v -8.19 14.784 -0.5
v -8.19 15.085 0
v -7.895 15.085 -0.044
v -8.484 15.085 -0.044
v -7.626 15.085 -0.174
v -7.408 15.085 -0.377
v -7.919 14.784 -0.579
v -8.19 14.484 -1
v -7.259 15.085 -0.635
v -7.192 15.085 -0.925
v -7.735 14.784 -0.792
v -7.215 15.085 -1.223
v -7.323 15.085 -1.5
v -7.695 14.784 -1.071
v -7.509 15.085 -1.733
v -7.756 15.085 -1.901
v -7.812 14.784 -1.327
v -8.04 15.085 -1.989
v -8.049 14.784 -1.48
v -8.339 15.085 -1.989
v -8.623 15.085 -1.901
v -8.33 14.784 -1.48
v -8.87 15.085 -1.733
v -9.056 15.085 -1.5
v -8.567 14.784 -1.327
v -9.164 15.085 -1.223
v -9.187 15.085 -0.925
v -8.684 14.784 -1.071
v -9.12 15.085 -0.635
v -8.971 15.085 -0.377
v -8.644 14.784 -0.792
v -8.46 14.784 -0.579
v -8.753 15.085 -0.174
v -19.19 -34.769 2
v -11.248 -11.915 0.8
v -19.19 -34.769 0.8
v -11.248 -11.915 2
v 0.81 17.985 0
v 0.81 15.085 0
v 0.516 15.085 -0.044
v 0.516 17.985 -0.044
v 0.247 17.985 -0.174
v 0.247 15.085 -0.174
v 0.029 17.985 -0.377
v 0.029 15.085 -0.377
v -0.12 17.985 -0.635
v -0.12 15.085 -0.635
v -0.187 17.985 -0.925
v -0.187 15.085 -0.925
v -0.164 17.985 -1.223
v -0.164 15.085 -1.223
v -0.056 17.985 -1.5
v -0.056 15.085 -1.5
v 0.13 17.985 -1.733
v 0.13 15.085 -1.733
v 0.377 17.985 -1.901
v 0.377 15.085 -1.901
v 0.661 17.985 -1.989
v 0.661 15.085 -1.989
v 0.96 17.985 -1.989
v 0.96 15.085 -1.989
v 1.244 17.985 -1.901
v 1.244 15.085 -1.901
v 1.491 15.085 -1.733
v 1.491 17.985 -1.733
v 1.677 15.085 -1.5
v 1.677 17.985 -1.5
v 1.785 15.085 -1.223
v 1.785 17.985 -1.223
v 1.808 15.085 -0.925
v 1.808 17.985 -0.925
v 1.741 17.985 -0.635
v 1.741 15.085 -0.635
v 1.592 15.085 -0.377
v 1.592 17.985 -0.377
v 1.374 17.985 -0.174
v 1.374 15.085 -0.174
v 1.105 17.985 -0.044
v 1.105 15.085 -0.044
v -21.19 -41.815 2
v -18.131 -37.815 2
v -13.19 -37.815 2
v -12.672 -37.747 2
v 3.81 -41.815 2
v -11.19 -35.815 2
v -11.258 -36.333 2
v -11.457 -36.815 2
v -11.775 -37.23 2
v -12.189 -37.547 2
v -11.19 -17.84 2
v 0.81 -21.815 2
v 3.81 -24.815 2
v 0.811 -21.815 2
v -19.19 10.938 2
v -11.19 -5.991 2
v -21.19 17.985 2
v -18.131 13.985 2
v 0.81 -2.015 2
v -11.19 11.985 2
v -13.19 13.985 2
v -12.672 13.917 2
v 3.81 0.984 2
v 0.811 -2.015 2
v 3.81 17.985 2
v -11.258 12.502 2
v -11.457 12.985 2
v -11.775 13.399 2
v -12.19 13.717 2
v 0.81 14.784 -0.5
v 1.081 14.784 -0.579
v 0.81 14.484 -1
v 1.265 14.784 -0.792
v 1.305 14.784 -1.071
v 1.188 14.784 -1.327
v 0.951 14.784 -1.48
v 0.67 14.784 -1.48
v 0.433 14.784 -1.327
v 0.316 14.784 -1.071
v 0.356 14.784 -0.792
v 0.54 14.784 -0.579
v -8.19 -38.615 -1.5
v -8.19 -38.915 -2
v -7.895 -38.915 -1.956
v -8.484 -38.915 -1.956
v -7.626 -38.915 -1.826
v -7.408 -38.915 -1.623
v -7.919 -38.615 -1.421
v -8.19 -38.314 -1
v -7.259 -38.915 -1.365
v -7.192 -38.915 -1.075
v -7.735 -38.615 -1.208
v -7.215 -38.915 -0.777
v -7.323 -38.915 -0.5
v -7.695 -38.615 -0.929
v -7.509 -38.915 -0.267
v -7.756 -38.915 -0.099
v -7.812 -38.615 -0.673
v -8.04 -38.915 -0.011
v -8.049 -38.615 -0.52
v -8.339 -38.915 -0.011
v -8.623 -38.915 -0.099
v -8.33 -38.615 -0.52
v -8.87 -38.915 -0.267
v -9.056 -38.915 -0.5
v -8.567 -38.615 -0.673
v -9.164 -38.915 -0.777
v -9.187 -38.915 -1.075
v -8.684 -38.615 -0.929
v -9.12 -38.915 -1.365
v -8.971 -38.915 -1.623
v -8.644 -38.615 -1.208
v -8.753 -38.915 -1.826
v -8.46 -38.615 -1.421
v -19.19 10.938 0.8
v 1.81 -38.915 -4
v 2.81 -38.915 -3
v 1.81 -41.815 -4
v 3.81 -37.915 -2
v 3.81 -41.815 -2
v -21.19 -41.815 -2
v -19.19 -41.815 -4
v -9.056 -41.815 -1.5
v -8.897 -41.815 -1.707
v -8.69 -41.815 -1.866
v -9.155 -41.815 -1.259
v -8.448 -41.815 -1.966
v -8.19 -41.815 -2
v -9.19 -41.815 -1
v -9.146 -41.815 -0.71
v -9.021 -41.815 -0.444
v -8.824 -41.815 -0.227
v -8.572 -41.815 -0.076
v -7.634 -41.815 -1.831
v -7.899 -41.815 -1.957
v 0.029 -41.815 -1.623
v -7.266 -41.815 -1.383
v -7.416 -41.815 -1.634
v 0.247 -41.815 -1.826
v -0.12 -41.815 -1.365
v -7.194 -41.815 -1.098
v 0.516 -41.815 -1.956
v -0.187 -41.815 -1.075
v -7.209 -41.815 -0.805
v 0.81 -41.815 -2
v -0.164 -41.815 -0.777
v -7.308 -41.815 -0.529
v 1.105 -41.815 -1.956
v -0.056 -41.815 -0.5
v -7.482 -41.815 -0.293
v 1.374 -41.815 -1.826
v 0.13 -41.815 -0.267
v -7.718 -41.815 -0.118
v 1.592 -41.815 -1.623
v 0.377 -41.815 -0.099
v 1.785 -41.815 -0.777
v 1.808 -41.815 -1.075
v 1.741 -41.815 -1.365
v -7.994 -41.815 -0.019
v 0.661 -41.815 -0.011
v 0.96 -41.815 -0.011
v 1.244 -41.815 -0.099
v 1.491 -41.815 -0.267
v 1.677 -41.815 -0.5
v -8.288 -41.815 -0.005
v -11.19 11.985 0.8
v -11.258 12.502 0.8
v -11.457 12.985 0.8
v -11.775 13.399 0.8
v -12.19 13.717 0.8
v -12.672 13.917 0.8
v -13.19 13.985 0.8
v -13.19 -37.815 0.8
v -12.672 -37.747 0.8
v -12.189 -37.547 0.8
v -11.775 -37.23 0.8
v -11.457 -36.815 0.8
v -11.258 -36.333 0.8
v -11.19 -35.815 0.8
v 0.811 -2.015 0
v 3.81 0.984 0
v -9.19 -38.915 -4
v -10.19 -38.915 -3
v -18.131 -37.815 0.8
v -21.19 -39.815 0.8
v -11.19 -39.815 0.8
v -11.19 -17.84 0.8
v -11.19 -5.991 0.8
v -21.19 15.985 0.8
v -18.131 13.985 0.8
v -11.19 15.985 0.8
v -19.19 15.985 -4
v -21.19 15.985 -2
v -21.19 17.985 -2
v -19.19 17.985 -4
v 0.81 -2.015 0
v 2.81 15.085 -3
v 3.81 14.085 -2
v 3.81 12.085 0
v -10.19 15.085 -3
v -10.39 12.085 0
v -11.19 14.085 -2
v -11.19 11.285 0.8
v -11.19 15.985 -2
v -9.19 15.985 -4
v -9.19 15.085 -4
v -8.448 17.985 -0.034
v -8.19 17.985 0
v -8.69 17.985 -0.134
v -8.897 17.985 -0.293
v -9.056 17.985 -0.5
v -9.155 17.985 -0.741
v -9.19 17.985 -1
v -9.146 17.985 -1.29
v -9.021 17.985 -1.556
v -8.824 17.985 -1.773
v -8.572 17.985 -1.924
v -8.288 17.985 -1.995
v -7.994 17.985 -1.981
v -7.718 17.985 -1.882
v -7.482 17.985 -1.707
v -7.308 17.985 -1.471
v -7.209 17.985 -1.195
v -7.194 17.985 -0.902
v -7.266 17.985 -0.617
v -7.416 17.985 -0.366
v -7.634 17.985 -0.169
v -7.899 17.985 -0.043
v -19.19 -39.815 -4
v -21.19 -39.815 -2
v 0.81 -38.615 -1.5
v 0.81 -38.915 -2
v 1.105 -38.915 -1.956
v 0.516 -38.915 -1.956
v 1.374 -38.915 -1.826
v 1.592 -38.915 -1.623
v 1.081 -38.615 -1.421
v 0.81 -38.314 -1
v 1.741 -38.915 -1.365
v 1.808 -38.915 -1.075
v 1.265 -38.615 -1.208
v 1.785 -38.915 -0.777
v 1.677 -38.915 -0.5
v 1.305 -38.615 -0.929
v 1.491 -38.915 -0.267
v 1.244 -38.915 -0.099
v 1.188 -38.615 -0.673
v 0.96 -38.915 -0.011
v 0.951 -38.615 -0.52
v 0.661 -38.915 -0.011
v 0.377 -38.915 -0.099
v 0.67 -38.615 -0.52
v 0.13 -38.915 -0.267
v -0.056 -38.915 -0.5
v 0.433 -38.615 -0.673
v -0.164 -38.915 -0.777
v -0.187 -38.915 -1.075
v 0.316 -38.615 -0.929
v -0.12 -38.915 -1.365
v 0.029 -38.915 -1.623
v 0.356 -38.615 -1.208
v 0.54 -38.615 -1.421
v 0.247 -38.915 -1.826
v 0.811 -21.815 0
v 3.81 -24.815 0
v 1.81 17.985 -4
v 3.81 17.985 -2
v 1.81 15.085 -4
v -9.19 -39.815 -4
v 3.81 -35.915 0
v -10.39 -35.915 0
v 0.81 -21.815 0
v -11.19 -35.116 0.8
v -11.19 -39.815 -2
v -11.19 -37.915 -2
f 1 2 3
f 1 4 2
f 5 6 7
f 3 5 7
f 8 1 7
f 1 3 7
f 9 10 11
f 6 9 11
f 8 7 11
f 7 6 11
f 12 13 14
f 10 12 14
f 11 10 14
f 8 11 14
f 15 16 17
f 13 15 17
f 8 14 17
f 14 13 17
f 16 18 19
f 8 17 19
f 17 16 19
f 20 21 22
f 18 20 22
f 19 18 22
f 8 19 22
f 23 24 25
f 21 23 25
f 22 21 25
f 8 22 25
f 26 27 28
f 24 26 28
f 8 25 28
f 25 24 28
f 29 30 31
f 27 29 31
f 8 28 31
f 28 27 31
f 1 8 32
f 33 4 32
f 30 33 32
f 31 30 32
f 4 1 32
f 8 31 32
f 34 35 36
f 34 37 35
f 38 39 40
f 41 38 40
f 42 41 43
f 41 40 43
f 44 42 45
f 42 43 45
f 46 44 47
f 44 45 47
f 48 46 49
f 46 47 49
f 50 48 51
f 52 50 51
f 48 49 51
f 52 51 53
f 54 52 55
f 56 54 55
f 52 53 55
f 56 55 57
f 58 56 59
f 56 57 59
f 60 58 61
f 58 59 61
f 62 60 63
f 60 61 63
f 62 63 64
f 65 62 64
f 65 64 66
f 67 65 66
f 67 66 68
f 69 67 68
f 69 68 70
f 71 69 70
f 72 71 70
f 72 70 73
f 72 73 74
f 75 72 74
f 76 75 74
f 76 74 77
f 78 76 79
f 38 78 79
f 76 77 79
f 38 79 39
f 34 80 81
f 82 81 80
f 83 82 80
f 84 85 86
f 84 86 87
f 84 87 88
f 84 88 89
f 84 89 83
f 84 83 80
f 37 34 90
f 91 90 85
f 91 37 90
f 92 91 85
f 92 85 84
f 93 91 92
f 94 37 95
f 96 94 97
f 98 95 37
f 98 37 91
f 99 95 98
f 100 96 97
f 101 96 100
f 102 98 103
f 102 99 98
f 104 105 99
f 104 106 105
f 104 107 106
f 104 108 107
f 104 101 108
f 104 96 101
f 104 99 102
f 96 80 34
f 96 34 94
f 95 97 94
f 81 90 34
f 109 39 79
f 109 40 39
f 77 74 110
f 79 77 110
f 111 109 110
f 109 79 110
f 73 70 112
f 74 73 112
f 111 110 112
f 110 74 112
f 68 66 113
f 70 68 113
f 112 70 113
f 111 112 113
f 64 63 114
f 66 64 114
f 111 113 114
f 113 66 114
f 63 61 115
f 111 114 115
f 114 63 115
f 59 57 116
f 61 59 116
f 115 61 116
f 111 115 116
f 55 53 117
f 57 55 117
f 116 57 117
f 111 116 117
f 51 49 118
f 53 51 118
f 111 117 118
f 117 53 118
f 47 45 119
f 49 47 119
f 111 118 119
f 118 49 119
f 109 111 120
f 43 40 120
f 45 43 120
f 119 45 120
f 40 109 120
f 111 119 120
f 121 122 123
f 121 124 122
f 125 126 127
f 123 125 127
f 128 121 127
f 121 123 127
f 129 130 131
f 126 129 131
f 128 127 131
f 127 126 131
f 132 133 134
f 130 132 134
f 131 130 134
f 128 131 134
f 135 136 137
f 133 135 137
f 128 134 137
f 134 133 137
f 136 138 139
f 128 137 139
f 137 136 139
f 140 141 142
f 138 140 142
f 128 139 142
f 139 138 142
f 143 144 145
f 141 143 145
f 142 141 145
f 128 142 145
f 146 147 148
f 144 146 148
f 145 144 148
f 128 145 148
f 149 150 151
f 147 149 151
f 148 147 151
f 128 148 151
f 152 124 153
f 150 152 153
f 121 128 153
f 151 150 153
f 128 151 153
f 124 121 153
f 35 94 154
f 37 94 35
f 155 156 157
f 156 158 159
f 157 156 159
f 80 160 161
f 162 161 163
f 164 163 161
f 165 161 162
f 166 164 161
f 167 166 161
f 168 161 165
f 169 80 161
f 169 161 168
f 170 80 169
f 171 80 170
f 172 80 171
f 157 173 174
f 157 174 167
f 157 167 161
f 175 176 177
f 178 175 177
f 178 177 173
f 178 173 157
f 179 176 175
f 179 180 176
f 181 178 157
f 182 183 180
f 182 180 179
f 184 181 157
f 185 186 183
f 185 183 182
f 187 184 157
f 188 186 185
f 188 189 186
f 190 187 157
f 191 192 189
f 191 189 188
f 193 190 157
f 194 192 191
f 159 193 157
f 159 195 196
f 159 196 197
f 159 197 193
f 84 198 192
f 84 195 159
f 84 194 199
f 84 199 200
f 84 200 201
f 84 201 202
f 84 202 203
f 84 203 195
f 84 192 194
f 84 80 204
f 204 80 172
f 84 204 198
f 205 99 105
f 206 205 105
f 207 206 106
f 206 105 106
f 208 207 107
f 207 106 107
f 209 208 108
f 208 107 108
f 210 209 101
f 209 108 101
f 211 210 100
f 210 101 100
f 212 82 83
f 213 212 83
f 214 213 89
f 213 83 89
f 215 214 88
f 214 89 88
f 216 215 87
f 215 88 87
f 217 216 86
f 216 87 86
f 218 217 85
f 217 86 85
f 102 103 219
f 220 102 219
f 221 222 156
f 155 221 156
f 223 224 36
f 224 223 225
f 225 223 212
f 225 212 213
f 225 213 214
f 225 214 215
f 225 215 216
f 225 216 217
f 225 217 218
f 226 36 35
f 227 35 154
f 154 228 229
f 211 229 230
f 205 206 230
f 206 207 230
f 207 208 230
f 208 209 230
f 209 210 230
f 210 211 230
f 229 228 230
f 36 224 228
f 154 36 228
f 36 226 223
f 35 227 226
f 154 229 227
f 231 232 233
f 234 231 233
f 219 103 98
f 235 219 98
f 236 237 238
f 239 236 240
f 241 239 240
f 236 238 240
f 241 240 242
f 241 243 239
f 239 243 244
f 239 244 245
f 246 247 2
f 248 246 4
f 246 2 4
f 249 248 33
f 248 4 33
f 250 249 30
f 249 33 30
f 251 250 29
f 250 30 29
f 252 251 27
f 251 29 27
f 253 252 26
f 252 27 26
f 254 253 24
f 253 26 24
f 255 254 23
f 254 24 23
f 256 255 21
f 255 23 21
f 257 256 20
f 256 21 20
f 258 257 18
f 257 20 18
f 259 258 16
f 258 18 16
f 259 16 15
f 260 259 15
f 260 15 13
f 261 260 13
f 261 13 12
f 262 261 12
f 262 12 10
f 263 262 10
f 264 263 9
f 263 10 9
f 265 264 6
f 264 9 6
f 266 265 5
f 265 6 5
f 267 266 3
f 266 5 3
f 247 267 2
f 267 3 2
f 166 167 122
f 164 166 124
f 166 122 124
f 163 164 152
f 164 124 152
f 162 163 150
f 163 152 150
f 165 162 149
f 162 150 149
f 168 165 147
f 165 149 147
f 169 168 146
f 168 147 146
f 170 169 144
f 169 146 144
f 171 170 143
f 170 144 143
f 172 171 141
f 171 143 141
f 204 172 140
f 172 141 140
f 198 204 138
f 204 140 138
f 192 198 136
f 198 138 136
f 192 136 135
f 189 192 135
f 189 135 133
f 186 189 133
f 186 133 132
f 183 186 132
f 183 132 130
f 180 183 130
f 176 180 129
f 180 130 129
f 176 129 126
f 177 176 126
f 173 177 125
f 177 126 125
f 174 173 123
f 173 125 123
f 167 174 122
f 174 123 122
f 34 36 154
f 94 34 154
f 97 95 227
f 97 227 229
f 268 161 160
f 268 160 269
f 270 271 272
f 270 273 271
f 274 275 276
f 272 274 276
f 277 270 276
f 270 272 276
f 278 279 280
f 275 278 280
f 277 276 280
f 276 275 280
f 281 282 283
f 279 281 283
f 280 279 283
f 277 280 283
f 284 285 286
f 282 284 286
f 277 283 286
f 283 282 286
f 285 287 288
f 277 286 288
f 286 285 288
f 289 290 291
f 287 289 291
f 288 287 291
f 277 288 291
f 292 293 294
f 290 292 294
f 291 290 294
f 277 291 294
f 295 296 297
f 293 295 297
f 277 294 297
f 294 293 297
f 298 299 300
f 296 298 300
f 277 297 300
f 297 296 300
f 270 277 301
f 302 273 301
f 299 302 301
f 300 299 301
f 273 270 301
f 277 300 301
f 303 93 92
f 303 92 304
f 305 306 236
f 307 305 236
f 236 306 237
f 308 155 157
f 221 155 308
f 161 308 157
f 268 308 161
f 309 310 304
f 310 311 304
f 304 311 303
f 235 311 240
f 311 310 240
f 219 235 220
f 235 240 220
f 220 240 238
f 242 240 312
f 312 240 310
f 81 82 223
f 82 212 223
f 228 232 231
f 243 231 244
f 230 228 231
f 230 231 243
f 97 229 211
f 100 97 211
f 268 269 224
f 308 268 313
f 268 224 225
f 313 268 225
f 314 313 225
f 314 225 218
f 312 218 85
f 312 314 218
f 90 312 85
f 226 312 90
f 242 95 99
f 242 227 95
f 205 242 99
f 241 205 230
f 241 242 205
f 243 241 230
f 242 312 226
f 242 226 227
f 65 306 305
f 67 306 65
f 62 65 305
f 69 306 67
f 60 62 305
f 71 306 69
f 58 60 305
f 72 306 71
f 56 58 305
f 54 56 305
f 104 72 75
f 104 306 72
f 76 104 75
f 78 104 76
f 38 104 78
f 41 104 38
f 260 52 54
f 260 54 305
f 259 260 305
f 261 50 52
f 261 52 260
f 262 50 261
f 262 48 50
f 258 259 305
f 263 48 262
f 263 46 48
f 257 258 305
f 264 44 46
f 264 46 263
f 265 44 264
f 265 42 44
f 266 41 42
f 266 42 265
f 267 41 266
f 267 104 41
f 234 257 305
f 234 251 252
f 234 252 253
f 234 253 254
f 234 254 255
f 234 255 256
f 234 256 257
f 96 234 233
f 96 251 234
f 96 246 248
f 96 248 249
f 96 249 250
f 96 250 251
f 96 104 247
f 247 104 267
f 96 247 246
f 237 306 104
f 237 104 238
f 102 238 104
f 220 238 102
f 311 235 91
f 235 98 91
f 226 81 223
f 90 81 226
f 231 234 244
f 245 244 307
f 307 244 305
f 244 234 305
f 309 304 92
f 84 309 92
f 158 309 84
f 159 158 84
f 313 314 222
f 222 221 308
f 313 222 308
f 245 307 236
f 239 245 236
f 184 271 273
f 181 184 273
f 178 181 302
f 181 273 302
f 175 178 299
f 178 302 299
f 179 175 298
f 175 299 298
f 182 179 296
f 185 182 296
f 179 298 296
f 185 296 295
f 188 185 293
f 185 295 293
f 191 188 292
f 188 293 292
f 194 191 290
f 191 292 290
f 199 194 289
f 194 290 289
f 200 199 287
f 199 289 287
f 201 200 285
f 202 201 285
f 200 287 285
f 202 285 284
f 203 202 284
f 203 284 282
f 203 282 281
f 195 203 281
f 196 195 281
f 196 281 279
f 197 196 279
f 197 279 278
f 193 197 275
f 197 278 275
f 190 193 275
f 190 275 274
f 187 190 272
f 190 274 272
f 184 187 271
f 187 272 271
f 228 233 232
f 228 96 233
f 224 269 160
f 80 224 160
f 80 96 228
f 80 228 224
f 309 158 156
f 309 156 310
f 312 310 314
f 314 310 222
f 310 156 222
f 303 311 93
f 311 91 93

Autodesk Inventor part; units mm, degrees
ref_plane "YZ Plane" through (0, 0, 0) normal (1, 0, 0) x (0, 1, 0)
ref_plane "XZ Plane" through (0, 0, 0) normal (0, 1, 0) x (-1, 0, 0)
ref_plane "XY Plane" through (0, 0, 0) normal (0, 0, 1) x (1, 0, 0)
sketch "Sketch1" plane through (0, 0, 0) normal (0, 0, 1) x (1, 0, 0)
  line L0 (-11.1895, 18.0847) -> (3.8105, 18.0847)
  line L1 (3.8105, 18.0847) -> (3.8105, -41.9153)
  line L2 (3.8105, -41.9153) -> (-11.1895, -41.9153)
  line L3 (-11.1895, -41.9153) -> (-11.1895, 18.0847)
  point P0 (0, 0)
  dimension "d0" = 15
  dimension "d1" = 60
extrude "Extrusion1" add sketch "Sketch1" along normal blind 2
sketch "Sketch2" plane through (-11.1895, -41.9153, 0) normal (0, -1, 0) x (1, 0, 0)
  line L0 (0, 2) -> (15, 2) projected
  line L1 (0, 2) -> (15, 2)
  line L2 (15, 2) -> (15, -4)
  line L3 (15, -4) -> (0, -4)
  line L4 (0, -4) -> (0, 2)
  line L5 (15, 0) -> (15, 2) projected
  point P0 (11.1895, 0)
  dimension "d4" = 6
extrude "Extrusion2" add sketch "Sketch2" against normal blind 3
sketch "Sketch3" plane through (-11.1895, 18.0847, 0) normal (0, 1, 0) x (1, 0, 0)
  line L0 (0, -2) -> (15, -2) projected
  line L1 (0, -2) -> (0, 4) projected
  line L2 (15, -2) -> (0, -2)
  line L3 (0, -2) -> (0, 4)
  line L4 (0, 4) -> (15, 4)
  line L5 (15, 4) -> (15, -2)
  point P0 (11.1895, 0)
extrude "Extrusion3" add sketch "Sketch3" against normal blind 3
chamfer "Chamfer1" distance 3 angle 45 2 edges at (-3.6895, 15.0847, 0) (-3.6895, -38.9153, 0)
sketch "Sketch4" plane through (-11.1895, -41.9153, 2) normal (0, -1, 0) x (1, 0, 0)
  line L0 (15, -6) -> (15, 0) projected
  line L1 (0, 0) -> (15, 0) projected
  point P0 (11.1895, -2)
  point P1 (12, -3)
  point P2 (3, -3)
  dimension "d12" = 3
  dimension "d13" = 12
  dimension "d14" = 3
  dimension "d15" = 3
hole "Hole1" at (0.8105, -41.9153, -1) at (-8.1895, -41.9153, -1) direction (0, 1, 0) diameter 2 depth 3 tip angle 118
sketch "Sketch5" plane through (-11.1895, 18.0847, 2) normal (0, 1, 0) x (1, 0, 0)
  circle A0 centre (12, 3) radius 1 projected
  circle A1 centre (3, 3) radius 1 projected
  point P0 (11.1895, 2)
hole "Hole2" at (0.8105, 18.0847, -1) at (-8.1895, 18.0847, -1) direction (0, -1, 0) diameter 2 depth 3 tip angle 118
sketch "Sketch6" plane through (0, 0, 2) normal (0, 0, 1) x (1, 0, 0)
  line L0 (3.8105, -41.9153) -> (-11.1895, -41.9153)
  line L1 (-11.1895, -41.9153) -> (-11.1895, -41.8153)
  line L2 (-11.1895, -41.8153) -> (3.8105, -41.8153)
  line L3 (3.8105, -41.8153) -> (3.8105, -41.9153)
  line L4 (3.8105, 17.9847) -> (-11.1895, 17.9847)
  line L5 (-11.1895, 17.9847) -> (-11.1895, 18.0847)
  line L6 (-11.1895, 18.0847) -> (3.8105, 18.0847)
  line L7 (3.8105, 18.0847) -> (3.8105, 17.9847)
  line L8 (3.8105, -41.9153) -> (3.8105, 18.0847) projected
  line L9 (3.8105, 18.0847) -> (-11.1895, 18.0847) projected
  line L10 (-11.1895, 18.0847) -> (-11.1895, -41.9153) projected
  line L11 (-11.1895, -41.9153) -> (3.8105, -41.9153) projected
  point P0 (0, 0)
  dimension "d30" = 0.1
  dimension "d31" = 0.1
extrude "Extrusion4" cut sketch "Sketch6" against normal blind 30 contours L0 L1 L2 L3 | L4 L5 L6 L7
chamfer "Chamfer2" distance 2 angle 45 2 edges at (3.8105, -40.3653, -4) (3.8105, 16.5347, -4)
chamfer "Chamfer3" distance 2 angle 45 2 edges at (-11.1895, 16.5347, -4) (-11.1895, -40.3653, -4)
sketch "Sketch7" plane through (0, 0, 2) normal (0, 0, 1) x (1, 0, 0)
  line L0 (3.8105, -41.8153) -> (3.8105, 17.9847) projected
  line L1 (3.8105, -2.0153) -> (0.8105, -2.0153)
  line L2 (0.8105, -2.0153) -> (0.8105, -21.8153)
  line L3 (0.8105, -21.8153) -> (3.8105, -21.8153)
  line L4 (3.8105, -21.8153) -> (3.8105, -2.0153)
  line L5 (3.8105, 17.9847) -> (-11.1895, 17.9847) projected
  line L6 (-11.1895, -41.8153) -> (3.8105, -41.8153) projected
  point P0 (0, 0)
  dimension "d40" = 3
  dimension "d41" = 20
  dimension "d42" = 20
extrude "Extrusion5" cut sketch "Sketch7" against normal blind 2
chamfer "Chamfer4" distance 3 angle 45 2 edges at (3.8105, -2.0153, 1) (3.8105, -21.8153, 1)
sketch "Sketch8" plane through (0, 0, 2) normal (0, 0, 1) x (1, 0, 0)
  line L0 (-11.1895, 14.0847) -> (-11.1895, 17.9847) projected
  line L1 (-11.1895, 17.9847) -> (-21.1895, 17.9847)
  line L2 (-21.1895, 17.9847) -> (-21.1895, -41.8153)
  line L3 (-21.1895, -41.8153) -> (-11.1895, -41.8153)
  line L4 (-11.1895, -41.8153) -> (-11.1895, 17.9847)
  line L5 (-11.1895, -41.8153) -> (3.8105, -41.8153) projected
  point P0 (0, 0)
  dimension "d48" = 10
extrude "Extrusion6" add sketch "Sketch8" against normal blind 1.2
chamfer "Chamfer5" distance 0.8 angle 45 1 edges at (-11.1895, -11.9153, 0)
sketch "Sketch9" plane through (0, 0, 0.8) normal (0, 0, -1) x (-1, 0, 0)
  line L0 (9.1895, 15.0847) -> (9.1895, 17.9847) projected
  line L1 (21.1895, 17.9847) -> (21.1895, -41.8153) projected
  line L2 (9.1895, 17.9847) -> (21.1895, 17.9847)
  line L3 (21.1895, 17.9847) -> (21.1895, 15.9847)
  line L4 (21.1895, 15.9847) -> (9.1895, 15.9847)
  line L5 (9.1895, 15.9847) -> (9.1895, 17.9847)
  line L6 (9.1895, -38.9153) -> (9.1895, -41.8153) projected
  line L7 (9.1895, -41.8153) -> (21.1895, -41.8153)
  line L8 (21.1895, -41.8153) -> (21.1895, -39.8153)
  line L9 (21.1895, -39.8153) -> (9.1895, -39.8153)
  line L10 (9.1895, -39.8153) -> (9.1895, -41.8153)
  line L11 (21.1895, 17.9847) -> (11.1895, 17.9847) projected
  point P0 (0, 0)
  point P1 (21.1895, -39.8153)
  point P2 (9.1895, -39.8153)
  point P3 (9.1895, 15.9847)
  dimension "d54" = 2
  dimension "d55" = 2
extrude "Extrusion7" add sketch "Sketch9" along normal blind 4.8
chamfer "Chamfer6" distance 2 angle 45 2 edges at (-21.1895, -40.8153, -4) (-21.1895, 16.9847, -4)
sketch "Sketch10" plane through (0, 0, 0.8) normal (0, 0, -1) x (-1, 0, 0)
  line L0 (11.1895, -39.8153) -> (11.1895, -35.1153) projected
  line L1 (11.1895, -37.8153) -> (19.1895, -37.8153)
  line L2 (19.1895, -37.8153) -> (19.1895, 13.9847)
  line L3 (19.1895, 13.9847) -> (11.1895, 13.9847)
  line L4 (11.1895, 13.9847) -> (11.1895, -37.8153)
  line L5 (9.1895, 15.9847) -> (19.1895, 15.9847) projected
  line L6 (21.1895, -39.8153) -> (21.1895, 15.9847) projected
  line L7 (19.1895, -39.8153) -> (9.1895, -39.8153) projected
  point P0 (0, 0)
  dimension "d61" = 2
  dimension "d62" = 2
  dimension "d63" = 2
extrude "Extrusion8" cut sketch "Sketch10" against normal blind 2
fillet "Fillet1" radius 2 2 edges at (-11.1895, 13.9847, 1.4) (-11.1895, -37.8153, 1.4)
sketch "Sketch12" plane through (0, 0, 2) normal (0, 0, 1) x (1, 0, 0)
  line L0 (-11.1895, -35.1153) -> (-11.1895, 11.2847) projected
  line L1 (-19.1895, 13.9847) -> (-13.1895, 13.9847) projected
  line L2 (-13.1895, -37.8153) -> (-19.1895, -37.8153) projected
  line L3 (-19.1895, -37.8153) -> (-19.1895, 13.9847) projected
  line L4 (-19.1895, -37.8153) -> (-10.1895, -11.9153) construction
  line L5 (-18.2449, -38.1436) -> (-9.2449, -12.2436)
  line L6 (-11.1341, -11.5871) -> (-20.1341, -37.4871)
  arc A0 (-20.1341, -37.4871) -> (-18.2449, -38.1436) centre (-19.1895, -37.8153) ccw
  arc A1 (-9.2449, -12.2436) -> (-11.1341, -11.5871) centre (-10.1895, -11.9153) ccw
  line L7 (-10.1895, -11.9153) -> (-19.1895, 13.9847) construction
  line L8 (-9.2449, -11.5871) -> (-18.2449, 14.3129)
  line L9 (-20.1341, 13.6564) -> (-11.1341, -12.2436)
  arc A2 (-11.1341, -12.2436) -> (-9.2449, -11.5871) centre (-10.1895, -11.9153) ccw
  arc A3 (-18.2449, 14.3129) -> (-20.1341, 13.6564) centre (-19.1895, 13.9847) ccw
  point P0 (0, 0)
  point P1 (-11.1895, -11.9153)
  point P2 (-14.6895, -24.8653)
  point P3 (-14.6895, 1.0347)
  point P4 (-19.1895, 10.9381)
  point P5 (-11.2482, -11.9153)
  point P6 (-19.1895, -34.7688)
  point P7 (-18.1309, -37.8153)
  point P8 (-11.1895, -17.8397)
  point P9 (-11.1895, -5.991)
  point P10 (-18.1309, 13.9847)
  dimension "d71" = 1
  dimension "d72" = 51.8
  dimension "d73" = 25.9
  dimension "d74" = 2
  dimension "d75" = 2
extrude "Extrusion10" add sketch "Sketch12" against normal blind 1.2 contours L5 L2 L3 L6 L9 L0 | L9 L6 L0 | L6 L9 L3 L1 L8 L0
properties part number "structural-bar"
